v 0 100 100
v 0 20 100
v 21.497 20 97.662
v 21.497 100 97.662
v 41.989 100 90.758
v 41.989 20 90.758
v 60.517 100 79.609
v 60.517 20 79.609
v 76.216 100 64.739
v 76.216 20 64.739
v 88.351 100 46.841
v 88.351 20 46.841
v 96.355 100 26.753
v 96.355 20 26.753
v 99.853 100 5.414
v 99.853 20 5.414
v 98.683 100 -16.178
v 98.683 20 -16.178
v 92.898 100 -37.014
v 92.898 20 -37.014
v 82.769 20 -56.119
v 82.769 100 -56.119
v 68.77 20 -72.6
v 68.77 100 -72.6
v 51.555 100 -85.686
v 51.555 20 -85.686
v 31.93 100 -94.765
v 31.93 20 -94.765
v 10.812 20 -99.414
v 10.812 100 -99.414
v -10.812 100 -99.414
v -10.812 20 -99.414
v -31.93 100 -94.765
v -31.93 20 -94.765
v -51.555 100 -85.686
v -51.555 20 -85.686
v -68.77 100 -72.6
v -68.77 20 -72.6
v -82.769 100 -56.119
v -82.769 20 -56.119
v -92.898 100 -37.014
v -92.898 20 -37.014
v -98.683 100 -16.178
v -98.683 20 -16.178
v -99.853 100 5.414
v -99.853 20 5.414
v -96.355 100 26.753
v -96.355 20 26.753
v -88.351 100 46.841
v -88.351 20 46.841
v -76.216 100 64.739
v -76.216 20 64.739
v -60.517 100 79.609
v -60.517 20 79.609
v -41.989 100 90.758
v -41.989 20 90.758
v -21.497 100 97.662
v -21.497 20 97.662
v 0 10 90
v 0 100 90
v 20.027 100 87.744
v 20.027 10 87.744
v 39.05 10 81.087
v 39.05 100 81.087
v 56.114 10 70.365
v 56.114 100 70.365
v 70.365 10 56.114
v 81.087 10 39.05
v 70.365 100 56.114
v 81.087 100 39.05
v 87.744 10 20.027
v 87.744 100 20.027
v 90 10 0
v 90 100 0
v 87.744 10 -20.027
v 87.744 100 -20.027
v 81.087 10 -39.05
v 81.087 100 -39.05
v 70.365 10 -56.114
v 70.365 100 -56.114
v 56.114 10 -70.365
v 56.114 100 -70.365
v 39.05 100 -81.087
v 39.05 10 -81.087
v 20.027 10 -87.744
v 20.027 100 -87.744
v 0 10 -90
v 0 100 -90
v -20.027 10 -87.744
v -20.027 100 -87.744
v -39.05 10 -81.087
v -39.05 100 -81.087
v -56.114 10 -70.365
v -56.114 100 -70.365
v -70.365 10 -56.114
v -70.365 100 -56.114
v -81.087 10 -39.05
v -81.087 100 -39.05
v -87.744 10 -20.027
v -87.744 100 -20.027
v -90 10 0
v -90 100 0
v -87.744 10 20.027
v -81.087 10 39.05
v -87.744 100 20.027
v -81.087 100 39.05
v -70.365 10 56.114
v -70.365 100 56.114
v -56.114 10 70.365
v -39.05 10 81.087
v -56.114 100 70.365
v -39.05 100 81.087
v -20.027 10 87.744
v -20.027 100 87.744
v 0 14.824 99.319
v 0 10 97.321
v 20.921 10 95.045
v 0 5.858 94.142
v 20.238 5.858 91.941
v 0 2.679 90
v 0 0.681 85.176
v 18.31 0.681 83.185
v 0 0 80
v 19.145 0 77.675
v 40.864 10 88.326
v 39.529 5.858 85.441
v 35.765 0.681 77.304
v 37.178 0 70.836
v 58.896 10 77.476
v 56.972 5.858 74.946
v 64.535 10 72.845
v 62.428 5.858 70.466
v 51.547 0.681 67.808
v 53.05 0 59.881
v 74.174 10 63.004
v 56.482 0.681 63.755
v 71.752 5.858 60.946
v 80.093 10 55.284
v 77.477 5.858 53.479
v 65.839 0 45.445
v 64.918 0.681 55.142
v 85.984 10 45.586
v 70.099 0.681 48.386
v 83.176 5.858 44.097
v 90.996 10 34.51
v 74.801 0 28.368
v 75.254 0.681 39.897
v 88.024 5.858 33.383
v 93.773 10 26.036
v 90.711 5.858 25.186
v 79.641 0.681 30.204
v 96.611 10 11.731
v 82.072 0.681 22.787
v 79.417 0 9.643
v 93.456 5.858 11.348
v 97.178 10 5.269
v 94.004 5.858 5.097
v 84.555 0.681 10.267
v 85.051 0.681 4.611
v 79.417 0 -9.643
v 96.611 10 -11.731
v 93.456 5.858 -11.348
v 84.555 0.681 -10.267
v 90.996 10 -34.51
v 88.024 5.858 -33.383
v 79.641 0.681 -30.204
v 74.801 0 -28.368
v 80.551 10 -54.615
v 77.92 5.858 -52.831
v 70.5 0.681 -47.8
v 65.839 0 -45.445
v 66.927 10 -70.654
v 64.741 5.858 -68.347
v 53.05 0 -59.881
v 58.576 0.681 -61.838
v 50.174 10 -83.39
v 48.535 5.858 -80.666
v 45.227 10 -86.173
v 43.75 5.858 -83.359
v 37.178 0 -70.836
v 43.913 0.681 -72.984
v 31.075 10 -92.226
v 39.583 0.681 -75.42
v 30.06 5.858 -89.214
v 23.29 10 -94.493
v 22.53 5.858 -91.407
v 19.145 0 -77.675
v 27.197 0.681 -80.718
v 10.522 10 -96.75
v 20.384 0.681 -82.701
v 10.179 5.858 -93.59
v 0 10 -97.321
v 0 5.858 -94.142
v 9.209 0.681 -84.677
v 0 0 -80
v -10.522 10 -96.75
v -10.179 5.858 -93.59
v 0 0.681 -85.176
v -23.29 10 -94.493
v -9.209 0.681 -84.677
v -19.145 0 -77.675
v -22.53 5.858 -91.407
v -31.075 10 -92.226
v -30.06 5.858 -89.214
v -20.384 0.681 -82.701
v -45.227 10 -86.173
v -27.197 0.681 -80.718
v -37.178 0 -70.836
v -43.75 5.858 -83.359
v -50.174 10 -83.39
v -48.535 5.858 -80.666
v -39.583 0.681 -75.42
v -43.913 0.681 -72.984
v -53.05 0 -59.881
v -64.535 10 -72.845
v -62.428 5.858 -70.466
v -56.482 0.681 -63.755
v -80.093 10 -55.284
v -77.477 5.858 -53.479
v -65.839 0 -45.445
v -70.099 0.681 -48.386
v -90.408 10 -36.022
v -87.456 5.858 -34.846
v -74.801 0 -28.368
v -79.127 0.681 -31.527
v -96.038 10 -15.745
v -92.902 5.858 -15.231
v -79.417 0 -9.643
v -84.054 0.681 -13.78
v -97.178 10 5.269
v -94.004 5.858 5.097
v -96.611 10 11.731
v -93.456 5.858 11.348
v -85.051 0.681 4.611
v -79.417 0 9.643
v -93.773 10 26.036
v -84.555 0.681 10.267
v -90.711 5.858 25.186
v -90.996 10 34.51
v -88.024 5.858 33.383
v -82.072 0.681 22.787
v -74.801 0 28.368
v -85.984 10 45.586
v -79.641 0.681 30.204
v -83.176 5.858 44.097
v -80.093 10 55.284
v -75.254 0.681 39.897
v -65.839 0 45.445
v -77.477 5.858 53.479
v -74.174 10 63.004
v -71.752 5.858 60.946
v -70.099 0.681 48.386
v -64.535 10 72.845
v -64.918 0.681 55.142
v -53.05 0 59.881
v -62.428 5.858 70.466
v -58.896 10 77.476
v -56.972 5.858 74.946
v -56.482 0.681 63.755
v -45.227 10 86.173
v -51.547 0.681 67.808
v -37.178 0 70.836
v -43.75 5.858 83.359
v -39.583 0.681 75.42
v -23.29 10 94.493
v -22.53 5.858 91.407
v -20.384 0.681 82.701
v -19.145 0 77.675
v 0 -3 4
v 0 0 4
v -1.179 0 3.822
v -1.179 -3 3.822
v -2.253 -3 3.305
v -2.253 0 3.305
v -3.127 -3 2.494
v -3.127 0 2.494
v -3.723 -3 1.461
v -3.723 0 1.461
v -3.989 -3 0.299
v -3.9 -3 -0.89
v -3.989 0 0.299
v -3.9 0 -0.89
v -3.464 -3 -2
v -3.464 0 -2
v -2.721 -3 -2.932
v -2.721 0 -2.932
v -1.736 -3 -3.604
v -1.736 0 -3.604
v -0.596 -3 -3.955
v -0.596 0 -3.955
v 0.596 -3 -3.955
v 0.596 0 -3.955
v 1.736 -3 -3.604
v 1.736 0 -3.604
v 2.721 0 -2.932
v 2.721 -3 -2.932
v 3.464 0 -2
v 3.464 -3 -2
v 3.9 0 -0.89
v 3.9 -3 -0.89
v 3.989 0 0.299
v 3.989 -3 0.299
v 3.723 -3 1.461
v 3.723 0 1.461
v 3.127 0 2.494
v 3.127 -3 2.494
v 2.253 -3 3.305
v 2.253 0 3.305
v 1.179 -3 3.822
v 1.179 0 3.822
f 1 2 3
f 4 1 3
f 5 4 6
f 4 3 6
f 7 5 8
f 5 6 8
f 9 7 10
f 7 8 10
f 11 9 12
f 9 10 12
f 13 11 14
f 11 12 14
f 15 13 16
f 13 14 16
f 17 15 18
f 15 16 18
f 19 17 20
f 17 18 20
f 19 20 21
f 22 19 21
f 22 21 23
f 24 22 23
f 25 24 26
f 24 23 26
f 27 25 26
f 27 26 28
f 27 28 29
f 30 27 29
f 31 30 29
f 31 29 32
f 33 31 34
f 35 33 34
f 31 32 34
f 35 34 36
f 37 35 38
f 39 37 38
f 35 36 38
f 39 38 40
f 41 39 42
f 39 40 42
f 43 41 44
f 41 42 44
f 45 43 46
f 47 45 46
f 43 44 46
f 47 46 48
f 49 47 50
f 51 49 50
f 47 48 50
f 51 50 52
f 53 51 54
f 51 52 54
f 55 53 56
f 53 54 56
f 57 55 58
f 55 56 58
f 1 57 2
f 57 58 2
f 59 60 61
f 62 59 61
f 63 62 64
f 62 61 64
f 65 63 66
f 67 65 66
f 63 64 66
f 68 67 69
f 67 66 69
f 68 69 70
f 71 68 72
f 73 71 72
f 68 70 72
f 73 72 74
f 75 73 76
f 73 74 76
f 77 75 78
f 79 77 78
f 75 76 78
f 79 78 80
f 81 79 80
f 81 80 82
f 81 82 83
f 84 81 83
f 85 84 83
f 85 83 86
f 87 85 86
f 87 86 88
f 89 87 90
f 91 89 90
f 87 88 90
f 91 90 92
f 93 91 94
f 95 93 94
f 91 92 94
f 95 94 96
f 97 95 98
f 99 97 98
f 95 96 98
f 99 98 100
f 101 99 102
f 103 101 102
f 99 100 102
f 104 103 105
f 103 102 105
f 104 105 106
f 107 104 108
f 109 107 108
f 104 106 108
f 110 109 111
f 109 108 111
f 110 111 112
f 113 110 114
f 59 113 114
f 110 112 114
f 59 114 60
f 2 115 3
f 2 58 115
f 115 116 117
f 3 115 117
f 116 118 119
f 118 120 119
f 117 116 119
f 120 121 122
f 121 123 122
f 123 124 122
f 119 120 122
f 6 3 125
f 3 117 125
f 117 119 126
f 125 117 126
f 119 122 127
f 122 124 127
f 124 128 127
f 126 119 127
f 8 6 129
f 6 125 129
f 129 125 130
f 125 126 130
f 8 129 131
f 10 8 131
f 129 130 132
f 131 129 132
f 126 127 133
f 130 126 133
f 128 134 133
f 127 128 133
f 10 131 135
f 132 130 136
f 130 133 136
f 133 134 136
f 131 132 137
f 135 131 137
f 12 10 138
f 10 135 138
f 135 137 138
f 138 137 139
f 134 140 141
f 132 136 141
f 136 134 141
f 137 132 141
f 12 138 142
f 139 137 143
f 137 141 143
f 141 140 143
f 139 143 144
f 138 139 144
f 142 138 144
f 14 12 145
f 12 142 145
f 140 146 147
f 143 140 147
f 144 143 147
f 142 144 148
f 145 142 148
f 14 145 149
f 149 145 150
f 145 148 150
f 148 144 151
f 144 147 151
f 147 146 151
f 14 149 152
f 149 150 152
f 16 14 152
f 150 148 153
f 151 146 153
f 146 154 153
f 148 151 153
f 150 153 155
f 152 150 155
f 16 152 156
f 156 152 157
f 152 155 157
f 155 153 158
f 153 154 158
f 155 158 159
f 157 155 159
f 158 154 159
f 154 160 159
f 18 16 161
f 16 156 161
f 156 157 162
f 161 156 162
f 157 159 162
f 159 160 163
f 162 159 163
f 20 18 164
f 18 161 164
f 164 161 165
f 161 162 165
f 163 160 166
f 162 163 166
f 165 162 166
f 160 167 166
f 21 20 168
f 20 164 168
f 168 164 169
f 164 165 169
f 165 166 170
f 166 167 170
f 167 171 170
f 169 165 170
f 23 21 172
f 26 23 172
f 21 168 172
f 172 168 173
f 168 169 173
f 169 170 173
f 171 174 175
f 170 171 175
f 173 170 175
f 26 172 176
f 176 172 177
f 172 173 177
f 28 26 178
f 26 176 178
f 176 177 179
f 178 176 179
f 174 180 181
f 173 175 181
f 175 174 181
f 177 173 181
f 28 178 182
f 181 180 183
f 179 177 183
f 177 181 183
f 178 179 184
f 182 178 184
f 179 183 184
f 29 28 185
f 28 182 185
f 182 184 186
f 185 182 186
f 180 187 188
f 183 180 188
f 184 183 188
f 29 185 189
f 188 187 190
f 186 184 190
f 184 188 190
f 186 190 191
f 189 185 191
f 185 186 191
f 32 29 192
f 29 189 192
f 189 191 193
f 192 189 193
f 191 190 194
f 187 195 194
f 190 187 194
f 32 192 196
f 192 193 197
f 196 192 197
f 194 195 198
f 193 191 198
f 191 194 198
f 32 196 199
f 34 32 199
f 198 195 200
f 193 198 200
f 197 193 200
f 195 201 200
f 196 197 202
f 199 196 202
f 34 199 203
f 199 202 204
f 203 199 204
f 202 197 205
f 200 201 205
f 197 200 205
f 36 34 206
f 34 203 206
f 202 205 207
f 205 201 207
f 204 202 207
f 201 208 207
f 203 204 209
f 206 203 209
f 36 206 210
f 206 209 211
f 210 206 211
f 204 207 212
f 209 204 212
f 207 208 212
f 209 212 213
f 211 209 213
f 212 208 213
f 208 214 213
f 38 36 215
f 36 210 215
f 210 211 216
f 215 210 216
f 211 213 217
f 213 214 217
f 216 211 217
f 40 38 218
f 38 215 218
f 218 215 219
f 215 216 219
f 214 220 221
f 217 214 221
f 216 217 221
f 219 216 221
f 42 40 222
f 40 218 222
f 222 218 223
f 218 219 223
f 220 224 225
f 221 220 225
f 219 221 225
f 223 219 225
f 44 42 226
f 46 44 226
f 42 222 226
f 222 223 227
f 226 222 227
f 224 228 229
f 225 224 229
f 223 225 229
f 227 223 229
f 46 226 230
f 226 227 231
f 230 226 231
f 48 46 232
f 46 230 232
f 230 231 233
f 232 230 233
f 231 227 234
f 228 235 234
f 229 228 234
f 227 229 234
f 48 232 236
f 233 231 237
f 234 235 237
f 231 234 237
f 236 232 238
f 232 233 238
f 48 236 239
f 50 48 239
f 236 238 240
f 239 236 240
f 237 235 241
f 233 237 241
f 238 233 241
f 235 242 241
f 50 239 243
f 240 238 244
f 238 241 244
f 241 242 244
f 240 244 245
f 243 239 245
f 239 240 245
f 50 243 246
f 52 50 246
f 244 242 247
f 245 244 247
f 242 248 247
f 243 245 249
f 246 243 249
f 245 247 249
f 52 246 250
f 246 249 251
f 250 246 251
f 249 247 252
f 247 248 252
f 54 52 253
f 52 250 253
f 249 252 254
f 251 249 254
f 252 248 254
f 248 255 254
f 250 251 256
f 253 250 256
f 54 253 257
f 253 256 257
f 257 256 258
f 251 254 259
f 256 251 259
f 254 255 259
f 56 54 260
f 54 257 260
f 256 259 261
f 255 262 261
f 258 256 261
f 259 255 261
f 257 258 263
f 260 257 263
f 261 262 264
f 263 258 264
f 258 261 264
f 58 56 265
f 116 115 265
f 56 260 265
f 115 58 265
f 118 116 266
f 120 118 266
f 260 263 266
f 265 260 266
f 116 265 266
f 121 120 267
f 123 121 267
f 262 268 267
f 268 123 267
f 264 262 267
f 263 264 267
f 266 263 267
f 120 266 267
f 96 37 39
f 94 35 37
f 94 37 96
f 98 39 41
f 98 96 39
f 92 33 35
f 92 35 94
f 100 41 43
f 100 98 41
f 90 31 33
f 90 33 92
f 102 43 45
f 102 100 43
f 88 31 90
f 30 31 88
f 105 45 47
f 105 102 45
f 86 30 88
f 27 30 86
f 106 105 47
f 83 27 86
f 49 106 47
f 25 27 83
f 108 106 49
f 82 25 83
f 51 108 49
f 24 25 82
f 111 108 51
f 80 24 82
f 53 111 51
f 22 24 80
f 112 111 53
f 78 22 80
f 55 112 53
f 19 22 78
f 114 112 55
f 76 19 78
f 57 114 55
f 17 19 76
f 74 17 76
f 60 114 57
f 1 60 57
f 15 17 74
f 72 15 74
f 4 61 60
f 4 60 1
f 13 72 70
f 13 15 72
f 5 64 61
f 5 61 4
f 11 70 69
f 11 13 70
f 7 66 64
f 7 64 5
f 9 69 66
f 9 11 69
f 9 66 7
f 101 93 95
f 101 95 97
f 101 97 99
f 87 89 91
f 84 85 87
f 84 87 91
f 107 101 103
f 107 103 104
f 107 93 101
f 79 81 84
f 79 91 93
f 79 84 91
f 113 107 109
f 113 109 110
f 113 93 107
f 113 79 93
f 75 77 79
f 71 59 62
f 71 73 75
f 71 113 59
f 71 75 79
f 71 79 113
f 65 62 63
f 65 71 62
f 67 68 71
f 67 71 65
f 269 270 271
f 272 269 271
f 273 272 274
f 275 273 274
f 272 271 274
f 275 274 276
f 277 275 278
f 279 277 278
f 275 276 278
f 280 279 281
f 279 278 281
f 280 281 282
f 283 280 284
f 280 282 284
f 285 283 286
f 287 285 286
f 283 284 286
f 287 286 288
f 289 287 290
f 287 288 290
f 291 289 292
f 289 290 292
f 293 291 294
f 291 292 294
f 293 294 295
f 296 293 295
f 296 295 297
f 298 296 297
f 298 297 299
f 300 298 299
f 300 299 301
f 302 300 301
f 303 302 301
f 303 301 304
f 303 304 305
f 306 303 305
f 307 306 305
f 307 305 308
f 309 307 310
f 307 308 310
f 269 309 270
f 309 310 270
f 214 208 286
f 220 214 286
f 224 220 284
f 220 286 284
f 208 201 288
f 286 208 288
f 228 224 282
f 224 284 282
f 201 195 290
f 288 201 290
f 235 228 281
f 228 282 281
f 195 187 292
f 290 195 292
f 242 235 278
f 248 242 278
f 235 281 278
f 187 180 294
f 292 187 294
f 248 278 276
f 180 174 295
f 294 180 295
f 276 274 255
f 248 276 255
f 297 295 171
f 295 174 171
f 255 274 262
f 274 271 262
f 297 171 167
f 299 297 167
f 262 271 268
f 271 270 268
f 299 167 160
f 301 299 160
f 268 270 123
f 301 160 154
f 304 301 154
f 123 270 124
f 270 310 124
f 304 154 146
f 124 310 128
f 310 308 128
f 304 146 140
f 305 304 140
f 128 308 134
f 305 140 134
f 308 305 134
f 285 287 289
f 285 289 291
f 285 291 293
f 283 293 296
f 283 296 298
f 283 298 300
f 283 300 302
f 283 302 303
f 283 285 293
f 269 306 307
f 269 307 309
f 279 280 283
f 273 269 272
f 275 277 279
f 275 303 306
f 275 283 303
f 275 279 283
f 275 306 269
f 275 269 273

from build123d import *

# Parameters (mm, degrees)
SKETCH2_R           = 100
BOSS_EXTRUDE1_DEPTH = 100
SKETCH3_R           = 90
CUT_EXTRUDE1_DEPTH  = 90
FILLET1_R           = 20
SKETCH4_R           = 4
BOSS_EXTRUDE2_DEPTH = 3


with BuildPart() as part:
    # Sketch2 → Boss-Extrude1 (new body)
    with BuildSketch(Plane(origin=(0, 0, 0), x_dir=(1, 0, 0), z_dir=(0, 1, 0))):
        with Locations(Location((0, 0, 0), (0, 0, 270))):
            Circle(SKETCH2_R)
    extrude(amount=BOSS_EXTRUDE1_DEPTH)

    # Sketch3 → Cut-Extrude1 (cut)
    with BuildSketch(Plane(origin=(0, 100, 0), x_dir=(1, 0, 0), z_dir=(0, 1, 0))):
        with Locations(Location((0, 0, 0), (0, 0, 270))):
            Circle(SKETCH3_R)
    extrude(amount=-CUT_EXTRUDE1_DEPTH, mode=Mode.SUBTRACT)

    # Fillet1
    fillet1_edges = [part.edges().sort_by_distance(p)[0] for p in [
        (0, 0, -100),
    ]]
    fillet(fillet1_edges, radius=FILLET1_R)

    # Sketch4 → Boss-Extrude2 (add)
    with BuildSketch(Plane.XZ):
        with Locations(Location((0, 0, 0), (0, 0, 90))):
            Circle(SKETCH4_R)
    extrude(amount=BOSS_EXTRUDE2_DEPTH)


solid = part.part
